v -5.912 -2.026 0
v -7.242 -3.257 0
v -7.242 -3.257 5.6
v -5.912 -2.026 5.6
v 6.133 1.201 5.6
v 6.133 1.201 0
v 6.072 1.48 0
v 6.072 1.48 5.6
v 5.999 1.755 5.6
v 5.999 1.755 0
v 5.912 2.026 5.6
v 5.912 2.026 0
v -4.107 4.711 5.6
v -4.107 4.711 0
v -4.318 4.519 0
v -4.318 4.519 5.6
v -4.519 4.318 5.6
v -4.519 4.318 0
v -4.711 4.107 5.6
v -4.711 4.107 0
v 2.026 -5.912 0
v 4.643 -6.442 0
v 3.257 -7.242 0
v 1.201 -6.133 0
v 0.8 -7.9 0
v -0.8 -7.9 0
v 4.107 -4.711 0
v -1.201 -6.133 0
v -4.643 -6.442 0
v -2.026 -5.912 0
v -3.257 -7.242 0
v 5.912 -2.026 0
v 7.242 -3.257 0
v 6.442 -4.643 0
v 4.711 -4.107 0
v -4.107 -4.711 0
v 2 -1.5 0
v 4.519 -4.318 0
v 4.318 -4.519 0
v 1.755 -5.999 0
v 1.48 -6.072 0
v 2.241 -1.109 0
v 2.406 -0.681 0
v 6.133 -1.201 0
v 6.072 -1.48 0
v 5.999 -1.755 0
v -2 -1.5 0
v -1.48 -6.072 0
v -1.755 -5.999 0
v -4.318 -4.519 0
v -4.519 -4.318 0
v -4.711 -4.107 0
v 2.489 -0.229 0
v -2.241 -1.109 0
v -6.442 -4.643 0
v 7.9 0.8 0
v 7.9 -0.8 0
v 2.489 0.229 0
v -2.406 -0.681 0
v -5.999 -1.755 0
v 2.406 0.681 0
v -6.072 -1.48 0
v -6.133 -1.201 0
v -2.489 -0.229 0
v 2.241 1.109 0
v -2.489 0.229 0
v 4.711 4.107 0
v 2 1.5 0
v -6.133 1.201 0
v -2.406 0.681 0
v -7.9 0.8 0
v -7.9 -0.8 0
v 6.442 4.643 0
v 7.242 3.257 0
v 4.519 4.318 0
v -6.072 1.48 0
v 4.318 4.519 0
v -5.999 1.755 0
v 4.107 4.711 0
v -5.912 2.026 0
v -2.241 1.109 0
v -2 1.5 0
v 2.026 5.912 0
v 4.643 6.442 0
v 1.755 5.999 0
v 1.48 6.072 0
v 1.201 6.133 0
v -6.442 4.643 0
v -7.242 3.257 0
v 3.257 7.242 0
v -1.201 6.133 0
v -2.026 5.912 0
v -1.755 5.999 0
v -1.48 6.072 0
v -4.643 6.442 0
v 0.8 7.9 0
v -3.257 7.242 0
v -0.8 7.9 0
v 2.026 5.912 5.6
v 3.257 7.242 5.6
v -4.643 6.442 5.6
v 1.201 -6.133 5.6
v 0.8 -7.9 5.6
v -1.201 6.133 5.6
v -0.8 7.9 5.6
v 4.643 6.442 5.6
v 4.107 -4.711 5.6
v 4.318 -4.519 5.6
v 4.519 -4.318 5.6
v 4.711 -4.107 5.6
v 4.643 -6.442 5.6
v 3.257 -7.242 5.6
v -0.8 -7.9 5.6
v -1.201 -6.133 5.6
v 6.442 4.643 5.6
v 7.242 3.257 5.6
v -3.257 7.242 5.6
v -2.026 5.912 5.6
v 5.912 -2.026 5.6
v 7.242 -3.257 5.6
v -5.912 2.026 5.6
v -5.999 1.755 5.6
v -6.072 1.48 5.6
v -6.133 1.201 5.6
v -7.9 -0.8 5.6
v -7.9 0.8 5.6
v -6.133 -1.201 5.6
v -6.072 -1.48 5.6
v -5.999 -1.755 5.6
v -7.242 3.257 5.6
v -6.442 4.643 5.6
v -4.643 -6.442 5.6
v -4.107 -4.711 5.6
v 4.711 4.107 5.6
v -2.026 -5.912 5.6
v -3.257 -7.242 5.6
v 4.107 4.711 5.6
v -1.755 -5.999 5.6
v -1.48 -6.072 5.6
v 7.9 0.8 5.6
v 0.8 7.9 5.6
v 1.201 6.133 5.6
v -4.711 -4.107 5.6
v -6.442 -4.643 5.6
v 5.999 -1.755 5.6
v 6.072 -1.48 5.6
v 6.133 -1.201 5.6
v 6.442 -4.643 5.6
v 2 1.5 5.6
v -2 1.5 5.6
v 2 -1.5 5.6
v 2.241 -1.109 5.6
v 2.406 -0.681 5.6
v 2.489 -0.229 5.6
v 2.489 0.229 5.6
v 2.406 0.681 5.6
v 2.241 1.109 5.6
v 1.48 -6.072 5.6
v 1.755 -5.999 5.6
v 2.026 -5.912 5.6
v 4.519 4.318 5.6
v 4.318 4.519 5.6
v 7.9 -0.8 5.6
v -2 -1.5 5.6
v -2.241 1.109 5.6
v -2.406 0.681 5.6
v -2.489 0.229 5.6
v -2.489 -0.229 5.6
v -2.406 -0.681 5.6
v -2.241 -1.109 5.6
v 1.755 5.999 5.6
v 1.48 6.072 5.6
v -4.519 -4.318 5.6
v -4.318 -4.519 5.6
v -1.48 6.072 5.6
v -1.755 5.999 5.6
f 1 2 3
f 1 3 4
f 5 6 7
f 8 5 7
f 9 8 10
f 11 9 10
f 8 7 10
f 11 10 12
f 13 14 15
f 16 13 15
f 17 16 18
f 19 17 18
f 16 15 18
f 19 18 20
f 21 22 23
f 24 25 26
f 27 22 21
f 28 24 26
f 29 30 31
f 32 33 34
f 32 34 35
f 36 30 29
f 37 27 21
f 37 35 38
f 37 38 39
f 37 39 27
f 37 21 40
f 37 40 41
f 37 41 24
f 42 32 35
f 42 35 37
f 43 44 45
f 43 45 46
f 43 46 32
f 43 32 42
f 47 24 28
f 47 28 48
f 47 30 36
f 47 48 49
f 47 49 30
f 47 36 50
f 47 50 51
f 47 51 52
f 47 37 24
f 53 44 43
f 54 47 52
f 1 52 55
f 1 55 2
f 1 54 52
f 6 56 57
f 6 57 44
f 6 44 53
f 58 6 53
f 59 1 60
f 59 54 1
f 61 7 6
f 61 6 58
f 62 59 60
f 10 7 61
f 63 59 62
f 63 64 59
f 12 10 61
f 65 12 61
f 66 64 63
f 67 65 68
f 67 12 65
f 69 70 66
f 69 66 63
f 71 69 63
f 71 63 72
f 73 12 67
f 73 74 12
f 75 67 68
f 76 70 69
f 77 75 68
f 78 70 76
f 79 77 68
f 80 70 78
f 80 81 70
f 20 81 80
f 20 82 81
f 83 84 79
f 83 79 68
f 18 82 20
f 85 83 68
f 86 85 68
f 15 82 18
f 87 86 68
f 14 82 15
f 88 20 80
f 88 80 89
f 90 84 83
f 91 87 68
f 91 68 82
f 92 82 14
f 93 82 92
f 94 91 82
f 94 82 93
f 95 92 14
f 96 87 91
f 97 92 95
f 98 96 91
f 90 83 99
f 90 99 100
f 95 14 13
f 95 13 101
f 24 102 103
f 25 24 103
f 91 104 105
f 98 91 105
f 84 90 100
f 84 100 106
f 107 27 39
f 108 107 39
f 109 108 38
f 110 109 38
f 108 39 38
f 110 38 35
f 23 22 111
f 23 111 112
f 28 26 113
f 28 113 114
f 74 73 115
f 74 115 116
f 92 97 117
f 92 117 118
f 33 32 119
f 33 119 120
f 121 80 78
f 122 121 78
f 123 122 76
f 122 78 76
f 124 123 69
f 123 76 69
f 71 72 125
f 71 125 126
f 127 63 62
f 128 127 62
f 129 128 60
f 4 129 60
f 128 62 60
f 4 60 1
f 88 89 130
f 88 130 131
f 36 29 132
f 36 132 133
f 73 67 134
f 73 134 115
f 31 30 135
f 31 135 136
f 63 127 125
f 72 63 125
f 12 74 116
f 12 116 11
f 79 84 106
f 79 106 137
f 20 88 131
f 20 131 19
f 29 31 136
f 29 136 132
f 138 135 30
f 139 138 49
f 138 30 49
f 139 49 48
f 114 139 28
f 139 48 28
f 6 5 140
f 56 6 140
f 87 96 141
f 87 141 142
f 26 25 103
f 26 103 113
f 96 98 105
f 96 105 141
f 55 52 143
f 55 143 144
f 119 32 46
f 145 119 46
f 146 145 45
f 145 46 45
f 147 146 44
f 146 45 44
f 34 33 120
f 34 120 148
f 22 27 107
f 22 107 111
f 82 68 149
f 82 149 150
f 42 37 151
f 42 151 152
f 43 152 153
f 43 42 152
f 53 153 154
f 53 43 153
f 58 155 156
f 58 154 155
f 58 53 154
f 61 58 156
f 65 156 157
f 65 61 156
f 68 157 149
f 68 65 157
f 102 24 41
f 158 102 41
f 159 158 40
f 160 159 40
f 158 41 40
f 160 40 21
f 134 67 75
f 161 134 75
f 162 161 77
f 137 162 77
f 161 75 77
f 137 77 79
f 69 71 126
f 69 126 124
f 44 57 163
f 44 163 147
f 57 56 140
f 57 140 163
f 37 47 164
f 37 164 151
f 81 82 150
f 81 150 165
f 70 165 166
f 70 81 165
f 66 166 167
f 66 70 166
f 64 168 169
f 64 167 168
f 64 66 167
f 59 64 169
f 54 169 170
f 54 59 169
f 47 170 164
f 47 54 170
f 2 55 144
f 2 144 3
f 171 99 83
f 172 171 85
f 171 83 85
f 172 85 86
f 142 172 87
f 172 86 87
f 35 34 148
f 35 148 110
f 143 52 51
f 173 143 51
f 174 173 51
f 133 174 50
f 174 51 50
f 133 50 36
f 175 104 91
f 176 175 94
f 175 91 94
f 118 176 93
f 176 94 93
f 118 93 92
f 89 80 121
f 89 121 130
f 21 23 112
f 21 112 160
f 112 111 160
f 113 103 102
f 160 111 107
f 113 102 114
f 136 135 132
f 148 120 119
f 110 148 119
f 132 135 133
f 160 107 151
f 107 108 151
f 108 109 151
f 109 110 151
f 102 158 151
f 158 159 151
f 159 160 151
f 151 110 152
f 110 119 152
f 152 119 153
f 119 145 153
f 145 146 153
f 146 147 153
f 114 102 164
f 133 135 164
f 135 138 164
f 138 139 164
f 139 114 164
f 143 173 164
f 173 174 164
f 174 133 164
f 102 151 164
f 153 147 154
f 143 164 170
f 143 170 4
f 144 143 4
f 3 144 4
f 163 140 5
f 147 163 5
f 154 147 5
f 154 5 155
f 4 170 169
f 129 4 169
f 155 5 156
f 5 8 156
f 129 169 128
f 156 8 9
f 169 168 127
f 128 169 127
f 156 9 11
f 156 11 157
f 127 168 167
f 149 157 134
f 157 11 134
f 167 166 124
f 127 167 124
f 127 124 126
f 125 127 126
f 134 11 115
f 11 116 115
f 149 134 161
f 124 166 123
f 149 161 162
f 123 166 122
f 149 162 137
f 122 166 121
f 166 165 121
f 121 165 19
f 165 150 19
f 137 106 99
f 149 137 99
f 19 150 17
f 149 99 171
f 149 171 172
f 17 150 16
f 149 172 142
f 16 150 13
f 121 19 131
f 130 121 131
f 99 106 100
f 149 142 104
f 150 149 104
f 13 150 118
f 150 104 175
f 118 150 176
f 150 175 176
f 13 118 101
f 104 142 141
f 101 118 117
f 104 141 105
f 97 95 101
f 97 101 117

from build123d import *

# Parameters (mm, degrees)
SKETCH1_R           = 6.25
BOSS_EXTRUDE1_DEPTH = 5.6
BOSS_EXTRUDE2_DEPTH = 5.6
CIRPATTERN1_COUNT   = 12
CUT_EXTRUDE1_DEPTH  = 7


with BuildPart() as part:
    # Sketch1 → Boss-Extrude1 (new body)
    with BuildSketch(Plane.XY):
        Circle(SKETCH1_R)
    extrude(amount=BOSS_EXTRUDE1_DEPTH)

    # Sketch3 → Boss-Extrude2 (add)
    with BuildSketch(Plane.XY):
        Polygon((-0.8, 7.9), (0.8, 7.9), (1.3, 5.7), (-1.3, 5.7), align=None)
    boss_extrude2 = extrude(amount=BOSS_EXTRUDE2_DEPTH)

    # CirPattern1: Boss-Extrude2 ×12 about axis
    cirpattern1_axis = Axis((0, 0, 0), (0, 0, 1))
    for i in range(1, CIRPATTERN1_COUNT):
        add(boss_extrude2.rotate(cirpattern1_axis, i * 360 / CIRPATTERN1_COUNT))

    # Sketch4 → Cut-Extrude1 (cut)
    with BuildSketch(Plane.XY):
        with BuildLine():
            Line((-2, -1.5), (2, -1.5))
            ThreePointArc((2, -1.5), (2.5, 0), (2, 1.5))
            Line((2, 1.5), (-2, 1.5))
            ThreePointArc((-2, 1.5), (-2.5, 0), (-2, -1.5))
        make_face()
    extrude(amount=CUT_EXTRUDE1_DEPTH, mode=Mode.SUBTRACT)


solid = part.part
